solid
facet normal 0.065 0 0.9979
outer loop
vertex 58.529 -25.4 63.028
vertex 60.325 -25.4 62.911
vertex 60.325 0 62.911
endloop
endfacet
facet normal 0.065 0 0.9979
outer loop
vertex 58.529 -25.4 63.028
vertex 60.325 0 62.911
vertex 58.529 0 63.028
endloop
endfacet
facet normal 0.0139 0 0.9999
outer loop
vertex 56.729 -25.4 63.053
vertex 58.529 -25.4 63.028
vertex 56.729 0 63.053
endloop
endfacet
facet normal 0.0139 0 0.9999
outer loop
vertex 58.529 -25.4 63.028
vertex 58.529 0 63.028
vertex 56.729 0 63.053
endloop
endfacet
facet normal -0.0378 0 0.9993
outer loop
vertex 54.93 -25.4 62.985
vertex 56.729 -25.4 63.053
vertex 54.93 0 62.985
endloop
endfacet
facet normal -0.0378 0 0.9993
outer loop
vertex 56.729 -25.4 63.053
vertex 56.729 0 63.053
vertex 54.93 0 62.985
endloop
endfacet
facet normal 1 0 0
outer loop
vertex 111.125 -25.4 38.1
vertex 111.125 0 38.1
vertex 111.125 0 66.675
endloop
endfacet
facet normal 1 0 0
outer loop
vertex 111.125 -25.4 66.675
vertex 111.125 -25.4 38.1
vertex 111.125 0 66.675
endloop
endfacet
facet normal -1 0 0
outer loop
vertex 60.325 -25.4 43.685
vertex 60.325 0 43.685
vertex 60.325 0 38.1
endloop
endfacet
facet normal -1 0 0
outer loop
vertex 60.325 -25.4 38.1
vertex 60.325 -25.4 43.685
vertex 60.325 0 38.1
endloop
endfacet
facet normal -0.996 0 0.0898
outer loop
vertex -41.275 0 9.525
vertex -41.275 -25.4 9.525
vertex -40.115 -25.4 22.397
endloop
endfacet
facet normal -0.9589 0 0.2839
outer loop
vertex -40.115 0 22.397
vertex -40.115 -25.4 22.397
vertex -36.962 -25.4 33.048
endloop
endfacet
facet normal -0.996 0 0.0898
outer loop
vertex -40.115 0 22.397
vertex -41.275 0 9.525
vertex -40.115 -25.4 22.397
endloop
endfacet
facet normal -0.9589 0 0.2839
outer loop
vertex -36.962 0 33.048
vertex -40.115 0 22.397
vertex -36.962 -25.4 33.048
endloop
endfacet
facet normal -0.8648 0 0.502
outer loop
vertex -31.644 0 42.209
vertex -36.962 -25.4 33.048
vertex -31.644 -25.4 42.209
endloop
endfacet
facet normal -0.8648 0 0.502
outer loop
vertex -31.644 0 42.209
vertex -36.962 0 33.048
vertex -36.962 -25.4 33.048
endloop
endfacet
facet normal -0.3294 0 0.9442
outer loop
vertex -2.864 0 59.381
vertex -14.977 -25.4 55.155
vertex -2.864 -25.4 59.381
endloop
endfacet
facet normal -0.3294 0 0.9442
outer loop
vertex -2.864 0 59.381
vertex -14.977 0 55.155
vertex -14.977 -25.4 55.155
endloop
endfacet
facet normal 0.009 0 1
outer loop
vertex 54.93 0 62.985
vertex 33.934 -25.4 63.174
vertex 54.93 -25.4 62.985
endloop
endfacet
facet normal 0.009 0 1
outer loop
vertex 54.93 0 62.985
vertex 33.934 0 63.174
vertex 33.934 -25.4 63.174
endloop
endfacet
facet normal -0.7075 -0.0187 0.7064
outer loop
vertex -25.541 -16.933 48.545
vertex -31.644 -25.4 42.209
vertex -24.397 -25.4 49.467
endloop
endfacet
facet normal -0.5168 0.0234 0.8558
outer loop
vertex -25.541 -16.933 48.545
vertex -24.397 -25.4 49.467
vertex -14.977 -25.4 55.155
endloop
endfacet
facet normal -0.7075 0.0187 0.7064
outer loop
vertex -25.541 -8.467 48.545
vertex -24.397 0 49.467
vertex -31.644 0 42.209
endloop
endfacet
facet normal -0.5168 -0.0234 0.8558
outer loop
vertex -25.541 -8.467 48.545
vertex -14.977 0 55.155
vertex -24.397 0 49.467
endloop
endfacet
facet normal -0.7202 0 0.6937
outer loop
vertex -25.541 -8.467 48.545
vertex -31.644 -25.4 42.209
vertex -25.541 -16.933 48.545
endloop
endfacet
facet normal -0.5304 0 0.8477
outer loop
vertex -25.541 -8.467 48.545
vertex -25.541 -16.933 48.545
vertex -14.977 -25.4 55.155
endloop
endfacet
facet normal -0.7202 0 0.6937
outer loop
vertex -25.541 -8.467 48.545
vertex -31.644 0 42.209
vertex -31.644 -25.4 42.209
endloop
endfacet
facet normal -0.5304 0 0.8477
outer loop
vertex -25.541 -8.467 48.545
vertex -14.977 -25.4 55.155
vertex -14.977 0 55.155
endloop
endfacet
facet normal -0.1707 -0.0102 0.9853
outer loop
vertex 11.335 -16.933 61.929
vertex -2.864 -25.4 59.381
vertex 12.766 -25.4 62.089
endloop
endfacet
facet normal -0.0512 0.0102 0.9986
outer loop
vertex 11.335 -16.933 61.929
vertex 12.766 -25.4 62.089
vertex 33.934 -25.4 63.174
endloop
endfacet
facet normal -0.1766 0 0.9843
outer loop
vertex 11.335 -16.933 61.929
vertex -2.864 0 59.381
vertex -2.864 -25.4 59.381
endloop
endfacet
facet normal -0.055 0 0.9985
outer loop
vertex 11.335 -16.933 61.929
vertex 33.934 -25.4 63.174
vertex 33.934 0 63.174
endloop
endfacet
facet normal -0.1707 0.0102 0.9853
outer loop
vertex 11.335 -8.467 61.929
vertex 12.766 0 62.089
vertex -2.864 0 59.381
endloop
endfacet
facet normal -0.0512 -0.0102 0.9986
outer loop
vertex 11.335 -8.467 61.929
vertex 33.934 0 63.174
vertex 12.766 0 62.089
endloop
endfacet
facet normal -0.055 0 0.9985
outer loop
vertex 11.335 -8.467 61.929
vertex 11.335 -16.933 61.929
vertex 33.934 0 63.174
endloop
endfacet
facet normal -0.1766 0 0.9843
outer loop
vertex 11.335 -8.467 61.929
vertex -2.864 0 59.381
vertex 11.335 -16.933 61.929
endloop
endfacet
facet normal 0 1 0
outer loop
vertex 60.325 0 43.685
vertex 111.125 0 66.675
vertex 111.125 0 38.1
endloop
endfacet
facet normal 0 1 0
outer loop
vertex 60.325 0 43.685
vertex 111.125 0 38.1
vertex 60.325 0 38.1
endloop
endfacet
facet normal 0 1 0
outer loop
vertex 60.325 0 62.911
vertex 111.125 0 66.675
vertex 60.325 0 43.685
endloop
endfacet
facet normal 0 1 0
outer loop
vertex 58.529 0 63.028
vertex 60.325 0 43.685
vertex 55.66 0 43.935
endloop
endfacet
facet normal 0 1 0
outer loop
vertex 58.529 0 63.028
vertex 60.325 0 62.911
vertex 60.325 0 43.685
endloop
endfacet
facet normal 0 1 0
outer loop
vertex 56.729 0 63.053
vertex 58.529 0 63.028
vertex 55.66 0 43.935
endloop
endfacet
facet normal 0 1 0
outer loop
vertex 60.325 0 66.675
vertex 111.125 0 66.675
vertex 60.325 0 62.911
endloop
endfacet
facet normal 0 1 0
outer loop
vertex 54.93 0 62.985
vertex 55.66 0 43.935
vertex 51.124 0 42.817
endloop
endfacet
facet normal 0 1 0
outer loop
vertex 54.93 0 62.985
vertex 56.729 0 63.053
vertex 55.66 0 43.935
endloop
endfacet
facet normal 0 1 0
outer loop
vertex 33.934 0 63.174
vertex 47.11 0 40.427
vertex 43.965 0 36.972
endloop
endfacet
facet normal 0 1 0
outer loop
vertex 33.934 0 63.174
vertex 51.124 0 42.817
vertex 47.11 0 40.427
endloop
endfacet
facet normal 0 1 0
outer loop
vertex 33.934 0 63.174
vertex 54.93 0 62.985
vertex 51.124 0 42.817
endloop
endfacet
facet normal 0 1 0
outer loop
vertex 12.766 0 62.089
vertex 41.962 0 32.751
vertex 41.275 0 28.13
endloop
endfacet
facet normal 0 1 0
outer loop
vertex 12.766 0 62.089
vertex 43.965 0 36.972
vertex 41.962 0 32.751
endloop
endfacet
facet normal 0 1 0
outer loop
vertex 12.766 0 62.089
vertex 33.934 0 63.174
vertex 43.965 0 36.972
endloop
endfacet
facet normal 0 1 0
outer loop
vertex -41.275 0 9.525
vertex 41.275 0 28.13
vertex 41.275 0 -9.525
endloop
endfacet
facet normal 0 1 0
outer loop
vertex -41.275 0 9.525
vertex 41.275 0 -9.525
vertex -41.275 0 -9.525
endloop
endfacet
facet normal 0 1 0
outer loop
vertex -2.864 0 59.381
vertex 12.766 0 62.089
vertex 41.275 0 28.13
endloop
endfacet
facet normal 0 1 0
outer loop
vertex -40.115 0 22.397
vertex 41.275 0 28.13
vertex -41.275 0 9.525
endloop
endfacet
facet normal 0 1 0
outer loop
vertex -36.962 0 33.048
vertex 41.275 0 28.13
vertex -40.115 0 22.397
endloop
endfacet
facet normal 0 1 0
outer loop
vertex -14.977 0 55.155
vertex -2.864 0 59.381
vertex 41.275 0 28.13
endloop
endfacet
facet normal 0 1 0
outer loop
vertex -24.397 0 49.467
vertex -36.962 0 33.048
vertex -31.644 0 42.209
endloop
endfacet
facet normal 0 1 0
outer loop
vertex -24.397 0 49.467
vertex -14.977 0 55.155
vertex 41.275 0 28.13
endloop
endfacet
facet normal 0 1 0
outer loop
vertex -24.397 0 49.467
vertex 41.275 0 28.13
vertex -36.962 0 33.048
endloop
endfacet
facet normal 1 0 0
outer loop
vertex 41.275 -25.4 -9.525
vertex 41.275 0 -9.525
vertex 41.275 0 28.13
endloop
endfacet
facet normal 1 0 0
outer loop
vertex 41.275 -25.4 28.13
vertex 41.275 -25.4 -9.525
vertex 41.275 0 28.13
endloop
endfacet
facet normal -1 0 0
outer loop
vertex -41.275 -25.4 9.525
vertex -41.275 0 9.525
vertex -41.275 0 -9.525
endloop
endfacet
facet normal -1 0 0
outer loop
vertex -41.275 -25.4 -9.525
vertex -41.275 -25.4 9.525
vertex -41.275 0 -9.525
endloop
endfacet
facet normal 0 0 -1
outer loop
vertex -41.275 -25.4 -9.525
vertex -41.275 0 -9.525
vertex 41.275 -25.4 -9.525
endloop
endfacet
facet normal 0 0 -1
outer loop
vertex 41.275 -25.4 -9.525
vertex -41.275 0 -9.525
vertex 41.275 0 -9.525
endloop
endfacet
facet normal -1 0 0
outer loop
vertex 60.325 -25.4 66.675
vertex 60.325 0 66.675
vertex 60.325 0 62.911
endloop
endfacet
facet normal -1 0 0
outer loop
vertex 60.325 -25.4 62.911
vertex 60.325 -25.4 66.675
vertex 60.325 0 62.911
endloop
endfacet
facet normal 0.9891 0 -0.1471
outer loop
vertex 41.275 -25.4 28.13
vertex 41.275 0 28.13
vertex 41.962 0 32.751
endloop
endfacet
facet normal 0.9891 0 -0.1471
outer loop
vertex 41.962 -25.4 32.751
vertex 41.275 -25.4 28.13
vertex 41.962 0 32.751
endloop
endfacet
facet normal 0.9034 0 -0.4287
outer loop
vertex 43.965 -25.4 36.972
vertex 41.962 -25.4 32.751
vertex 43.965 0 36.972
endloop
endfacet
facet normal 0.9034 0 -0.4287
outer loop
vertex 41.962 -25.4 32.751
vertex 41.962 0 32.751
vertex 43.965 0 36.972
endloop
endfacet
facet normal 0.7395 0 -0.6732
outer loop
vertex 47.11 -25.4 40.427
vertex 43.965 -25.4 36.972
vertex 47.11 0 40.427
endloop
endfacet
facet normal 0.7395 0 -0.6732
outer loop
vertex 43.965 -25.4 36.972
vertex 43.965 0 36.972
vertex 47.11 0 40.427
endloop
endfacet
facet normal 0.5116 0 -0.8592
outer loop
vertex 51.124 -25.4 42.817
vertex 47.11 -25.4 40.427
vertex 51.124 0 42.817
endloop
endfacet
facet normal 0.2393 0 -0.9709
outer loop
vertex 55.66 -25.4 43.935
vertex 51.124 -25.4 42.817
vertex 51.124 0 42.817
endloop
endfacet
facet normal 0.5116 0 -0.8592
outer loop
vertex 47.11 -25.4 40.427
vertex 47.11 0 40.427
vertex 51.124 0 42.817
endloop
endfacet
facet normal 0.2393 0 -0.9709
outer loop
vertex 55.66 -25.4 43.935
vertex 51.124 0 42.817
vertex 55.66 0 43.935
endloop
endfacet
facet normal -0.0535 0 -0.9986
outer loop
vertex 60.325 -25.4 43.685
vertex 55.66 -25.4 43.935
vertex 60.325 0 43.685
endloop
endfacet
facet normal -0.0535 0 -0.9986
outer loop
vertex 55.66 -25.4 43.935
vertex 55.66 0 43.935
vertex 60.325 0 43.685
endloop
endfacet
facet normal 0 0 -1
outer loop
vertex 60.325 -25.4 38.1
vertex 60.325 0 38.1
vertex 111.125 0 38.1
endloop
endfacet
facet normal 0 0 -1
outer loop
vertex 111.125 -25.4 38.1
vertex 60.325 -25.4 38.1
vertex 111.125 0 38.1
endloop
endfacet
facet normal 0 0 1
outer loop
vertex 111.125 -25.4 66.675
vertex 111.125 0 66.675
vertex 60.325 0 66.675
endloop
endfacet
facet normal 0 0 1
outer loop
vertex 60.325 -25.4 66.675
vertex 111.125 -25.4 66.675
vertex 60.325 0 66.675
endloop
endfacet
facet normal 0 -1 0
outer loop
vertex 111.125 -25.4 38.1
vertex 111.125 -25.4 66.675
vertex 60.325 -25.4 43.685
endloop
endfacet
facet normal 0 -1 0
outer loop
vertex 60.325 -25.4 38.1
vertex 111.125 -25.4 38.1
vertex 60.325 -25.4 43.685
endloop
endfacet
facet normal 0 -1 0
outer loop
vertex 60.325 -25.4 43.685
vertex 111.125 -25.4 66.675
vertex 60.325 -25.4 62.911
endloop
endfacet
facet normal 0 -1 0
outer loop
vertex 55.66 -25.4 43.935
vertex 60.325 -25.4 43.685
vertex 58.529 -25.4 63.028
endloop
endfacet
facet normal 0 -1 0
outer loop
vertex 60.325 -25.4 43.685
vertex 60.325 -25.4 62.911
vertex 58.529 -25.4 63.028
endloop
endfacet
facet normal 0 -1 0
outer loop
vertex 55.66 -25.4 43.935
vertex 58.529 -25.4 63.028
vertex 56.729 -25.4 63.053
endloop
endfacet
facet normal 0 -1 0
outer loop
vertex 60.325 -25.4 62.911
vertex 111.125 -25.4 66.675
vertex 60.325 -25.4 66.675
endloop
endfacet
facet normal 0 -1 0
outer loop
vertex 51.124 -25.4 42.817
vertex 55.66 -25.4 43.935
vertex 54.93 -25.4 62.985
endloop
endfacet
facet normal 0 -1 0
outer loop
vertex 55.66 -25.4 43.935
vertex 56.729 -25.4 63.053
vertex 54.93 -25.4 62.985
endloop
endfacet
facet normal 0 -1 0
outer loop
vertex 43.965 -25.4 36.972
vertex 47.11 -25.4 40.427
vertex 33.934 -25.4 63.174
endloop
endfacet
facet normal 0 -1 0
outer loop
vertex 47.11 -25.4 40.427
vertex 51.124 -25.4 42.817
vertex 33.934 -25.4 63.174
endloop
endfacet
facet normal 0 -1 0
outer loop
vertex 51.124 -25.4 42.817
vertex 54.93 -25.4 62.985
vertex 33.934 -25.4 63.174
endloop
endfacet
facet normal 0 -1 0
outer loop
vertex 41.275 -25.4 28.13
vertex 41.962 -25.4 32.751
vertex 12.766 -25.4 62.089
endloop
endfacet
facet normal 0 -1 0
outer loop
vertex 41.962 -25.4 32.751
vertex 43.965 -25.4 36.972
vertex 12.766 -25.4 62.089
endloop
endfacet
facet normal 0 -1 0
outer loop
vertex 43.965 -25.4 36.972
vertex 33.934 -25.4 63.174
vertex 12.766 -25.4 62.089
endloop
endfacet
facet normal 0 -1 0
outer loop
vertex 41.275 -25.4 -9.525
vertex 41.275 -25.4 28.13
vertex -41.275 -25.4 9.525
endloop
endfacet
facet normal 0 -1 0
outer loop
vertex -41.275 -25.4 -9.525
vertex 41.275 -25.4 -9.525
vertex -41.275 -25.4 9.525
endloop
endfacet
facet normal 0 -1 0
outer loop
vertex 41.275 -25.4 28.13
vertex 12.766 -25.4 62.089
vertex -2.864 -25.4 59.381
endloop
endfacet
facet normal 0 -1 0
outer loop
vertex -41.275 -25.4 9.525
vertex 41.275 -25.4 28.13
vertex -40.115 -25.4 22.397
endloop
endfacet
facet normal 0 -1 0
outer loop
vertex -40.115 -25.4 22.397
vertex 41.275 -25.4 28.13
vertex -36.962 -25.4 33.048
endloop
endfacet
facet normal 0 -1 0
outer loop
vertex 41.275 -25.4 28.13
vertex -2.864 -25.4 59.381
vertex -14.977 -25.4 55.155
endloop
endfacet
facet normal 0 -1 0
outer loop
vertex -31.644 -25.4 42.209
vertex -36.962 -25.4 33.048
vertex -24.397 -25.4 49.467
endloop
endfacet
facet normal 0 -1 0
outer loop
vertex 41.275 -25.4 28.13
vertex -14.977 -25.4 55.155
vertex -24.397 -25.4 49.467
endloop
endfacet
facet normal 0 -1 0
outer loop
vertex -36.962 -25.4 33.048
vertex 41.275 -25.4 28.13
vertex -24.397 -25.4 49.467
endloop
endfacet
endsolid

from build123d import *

# Parameters (mm, degrees)
F1_DEPTH = 25.4


with BuildPart() as f1:
    # F0 (on Front) → F1 (new body)
    with BuildSketch(Plane.XZ):
        with BuildLine():
            add(Edge.make_bspline(
                [(-41.275, 9.525), (-40.918331, 65.79854), (12.782067, 63.656478), (54.930287, 62.984836)],
                knots=[0, 0, 0, 0, 110.017253, 110.017253, 110.017253, 110.017253], degree=3))
            Line((-41.275, 9.525), (22.225, 9.525))
            Line((22.225, 9.525), (22.225, 28.130446))
            ThreePointArc((22.225, 28.130446), (31.681597, 52.028481), (54.930287, 62.984836))
        make_face()
        Polygon((22.225, 9.525), (-41.275, 9.525), (-41.275, -9.525), (41.275, -9.525), (41.275, 9.525), align=None)
        with BuildLine():
            Line((22.225, 28.130446), (22.225, 9.525))
            Line((22.225, 9.525), (41.275, 9.525))
            Line((41.275, 9.525), (41.275, 28.130446))
            ThreePointArc((41.275, 28.130446), (47.109768, 40.427169), (60.325, 43.684706))
            Line((60.325, 43.684706), (60.325, 62.910829))
            add(Edge.make_bspline(
                [(54.930287, 62.984836), (56.751848, 62.955809), (58.551832, 62.929529), (60.325, 62.910829)],
                knots=[110.017253, 110.017253, 110.017253, 110.017253, 114.771977, 114.771977, 114.771977, 114.771977], degree=3))
            ThreePointArc((54.930287, 62.984836), (31.681597, 52.028481), (22.225, 28.130446))
        make_face()
        with BuildLine():
            ThreePointArc((60.325, 62.910829), (57.629075, 63.05216), (54.930287, 62.984836))
            add(Edge.make_bspline(
                [(54.930287, 62.984836), (56.751848, 62.955809), (58.551832, 62.929529), (60.325, 62.910829)],
                knots=[110.017253, 110.017253, 110.017253, 110.017253, 114.771977, 114.771977, 114.771977, 114.771977], degree=3))
        make_face()
        Polygon((85.720036, 62.910829), (60.325, 62.910829), (60.325, 43.684706), (60.325, 38.1), (85.687317, 38.1), align=None)
        Polygon((60.325, 66.675), (60.325, 62.910829), (85.720036, 62.910829), (85.725, 66.675), align=None)
        Polygon((85.725, 66.675), (85.720036, 62.910829), (85.687317, 38.1), (111.125, 38.1), (111.125, 66.675), align=None)
    extrude(amount=F1_DEPTH)


solid = f1.part
